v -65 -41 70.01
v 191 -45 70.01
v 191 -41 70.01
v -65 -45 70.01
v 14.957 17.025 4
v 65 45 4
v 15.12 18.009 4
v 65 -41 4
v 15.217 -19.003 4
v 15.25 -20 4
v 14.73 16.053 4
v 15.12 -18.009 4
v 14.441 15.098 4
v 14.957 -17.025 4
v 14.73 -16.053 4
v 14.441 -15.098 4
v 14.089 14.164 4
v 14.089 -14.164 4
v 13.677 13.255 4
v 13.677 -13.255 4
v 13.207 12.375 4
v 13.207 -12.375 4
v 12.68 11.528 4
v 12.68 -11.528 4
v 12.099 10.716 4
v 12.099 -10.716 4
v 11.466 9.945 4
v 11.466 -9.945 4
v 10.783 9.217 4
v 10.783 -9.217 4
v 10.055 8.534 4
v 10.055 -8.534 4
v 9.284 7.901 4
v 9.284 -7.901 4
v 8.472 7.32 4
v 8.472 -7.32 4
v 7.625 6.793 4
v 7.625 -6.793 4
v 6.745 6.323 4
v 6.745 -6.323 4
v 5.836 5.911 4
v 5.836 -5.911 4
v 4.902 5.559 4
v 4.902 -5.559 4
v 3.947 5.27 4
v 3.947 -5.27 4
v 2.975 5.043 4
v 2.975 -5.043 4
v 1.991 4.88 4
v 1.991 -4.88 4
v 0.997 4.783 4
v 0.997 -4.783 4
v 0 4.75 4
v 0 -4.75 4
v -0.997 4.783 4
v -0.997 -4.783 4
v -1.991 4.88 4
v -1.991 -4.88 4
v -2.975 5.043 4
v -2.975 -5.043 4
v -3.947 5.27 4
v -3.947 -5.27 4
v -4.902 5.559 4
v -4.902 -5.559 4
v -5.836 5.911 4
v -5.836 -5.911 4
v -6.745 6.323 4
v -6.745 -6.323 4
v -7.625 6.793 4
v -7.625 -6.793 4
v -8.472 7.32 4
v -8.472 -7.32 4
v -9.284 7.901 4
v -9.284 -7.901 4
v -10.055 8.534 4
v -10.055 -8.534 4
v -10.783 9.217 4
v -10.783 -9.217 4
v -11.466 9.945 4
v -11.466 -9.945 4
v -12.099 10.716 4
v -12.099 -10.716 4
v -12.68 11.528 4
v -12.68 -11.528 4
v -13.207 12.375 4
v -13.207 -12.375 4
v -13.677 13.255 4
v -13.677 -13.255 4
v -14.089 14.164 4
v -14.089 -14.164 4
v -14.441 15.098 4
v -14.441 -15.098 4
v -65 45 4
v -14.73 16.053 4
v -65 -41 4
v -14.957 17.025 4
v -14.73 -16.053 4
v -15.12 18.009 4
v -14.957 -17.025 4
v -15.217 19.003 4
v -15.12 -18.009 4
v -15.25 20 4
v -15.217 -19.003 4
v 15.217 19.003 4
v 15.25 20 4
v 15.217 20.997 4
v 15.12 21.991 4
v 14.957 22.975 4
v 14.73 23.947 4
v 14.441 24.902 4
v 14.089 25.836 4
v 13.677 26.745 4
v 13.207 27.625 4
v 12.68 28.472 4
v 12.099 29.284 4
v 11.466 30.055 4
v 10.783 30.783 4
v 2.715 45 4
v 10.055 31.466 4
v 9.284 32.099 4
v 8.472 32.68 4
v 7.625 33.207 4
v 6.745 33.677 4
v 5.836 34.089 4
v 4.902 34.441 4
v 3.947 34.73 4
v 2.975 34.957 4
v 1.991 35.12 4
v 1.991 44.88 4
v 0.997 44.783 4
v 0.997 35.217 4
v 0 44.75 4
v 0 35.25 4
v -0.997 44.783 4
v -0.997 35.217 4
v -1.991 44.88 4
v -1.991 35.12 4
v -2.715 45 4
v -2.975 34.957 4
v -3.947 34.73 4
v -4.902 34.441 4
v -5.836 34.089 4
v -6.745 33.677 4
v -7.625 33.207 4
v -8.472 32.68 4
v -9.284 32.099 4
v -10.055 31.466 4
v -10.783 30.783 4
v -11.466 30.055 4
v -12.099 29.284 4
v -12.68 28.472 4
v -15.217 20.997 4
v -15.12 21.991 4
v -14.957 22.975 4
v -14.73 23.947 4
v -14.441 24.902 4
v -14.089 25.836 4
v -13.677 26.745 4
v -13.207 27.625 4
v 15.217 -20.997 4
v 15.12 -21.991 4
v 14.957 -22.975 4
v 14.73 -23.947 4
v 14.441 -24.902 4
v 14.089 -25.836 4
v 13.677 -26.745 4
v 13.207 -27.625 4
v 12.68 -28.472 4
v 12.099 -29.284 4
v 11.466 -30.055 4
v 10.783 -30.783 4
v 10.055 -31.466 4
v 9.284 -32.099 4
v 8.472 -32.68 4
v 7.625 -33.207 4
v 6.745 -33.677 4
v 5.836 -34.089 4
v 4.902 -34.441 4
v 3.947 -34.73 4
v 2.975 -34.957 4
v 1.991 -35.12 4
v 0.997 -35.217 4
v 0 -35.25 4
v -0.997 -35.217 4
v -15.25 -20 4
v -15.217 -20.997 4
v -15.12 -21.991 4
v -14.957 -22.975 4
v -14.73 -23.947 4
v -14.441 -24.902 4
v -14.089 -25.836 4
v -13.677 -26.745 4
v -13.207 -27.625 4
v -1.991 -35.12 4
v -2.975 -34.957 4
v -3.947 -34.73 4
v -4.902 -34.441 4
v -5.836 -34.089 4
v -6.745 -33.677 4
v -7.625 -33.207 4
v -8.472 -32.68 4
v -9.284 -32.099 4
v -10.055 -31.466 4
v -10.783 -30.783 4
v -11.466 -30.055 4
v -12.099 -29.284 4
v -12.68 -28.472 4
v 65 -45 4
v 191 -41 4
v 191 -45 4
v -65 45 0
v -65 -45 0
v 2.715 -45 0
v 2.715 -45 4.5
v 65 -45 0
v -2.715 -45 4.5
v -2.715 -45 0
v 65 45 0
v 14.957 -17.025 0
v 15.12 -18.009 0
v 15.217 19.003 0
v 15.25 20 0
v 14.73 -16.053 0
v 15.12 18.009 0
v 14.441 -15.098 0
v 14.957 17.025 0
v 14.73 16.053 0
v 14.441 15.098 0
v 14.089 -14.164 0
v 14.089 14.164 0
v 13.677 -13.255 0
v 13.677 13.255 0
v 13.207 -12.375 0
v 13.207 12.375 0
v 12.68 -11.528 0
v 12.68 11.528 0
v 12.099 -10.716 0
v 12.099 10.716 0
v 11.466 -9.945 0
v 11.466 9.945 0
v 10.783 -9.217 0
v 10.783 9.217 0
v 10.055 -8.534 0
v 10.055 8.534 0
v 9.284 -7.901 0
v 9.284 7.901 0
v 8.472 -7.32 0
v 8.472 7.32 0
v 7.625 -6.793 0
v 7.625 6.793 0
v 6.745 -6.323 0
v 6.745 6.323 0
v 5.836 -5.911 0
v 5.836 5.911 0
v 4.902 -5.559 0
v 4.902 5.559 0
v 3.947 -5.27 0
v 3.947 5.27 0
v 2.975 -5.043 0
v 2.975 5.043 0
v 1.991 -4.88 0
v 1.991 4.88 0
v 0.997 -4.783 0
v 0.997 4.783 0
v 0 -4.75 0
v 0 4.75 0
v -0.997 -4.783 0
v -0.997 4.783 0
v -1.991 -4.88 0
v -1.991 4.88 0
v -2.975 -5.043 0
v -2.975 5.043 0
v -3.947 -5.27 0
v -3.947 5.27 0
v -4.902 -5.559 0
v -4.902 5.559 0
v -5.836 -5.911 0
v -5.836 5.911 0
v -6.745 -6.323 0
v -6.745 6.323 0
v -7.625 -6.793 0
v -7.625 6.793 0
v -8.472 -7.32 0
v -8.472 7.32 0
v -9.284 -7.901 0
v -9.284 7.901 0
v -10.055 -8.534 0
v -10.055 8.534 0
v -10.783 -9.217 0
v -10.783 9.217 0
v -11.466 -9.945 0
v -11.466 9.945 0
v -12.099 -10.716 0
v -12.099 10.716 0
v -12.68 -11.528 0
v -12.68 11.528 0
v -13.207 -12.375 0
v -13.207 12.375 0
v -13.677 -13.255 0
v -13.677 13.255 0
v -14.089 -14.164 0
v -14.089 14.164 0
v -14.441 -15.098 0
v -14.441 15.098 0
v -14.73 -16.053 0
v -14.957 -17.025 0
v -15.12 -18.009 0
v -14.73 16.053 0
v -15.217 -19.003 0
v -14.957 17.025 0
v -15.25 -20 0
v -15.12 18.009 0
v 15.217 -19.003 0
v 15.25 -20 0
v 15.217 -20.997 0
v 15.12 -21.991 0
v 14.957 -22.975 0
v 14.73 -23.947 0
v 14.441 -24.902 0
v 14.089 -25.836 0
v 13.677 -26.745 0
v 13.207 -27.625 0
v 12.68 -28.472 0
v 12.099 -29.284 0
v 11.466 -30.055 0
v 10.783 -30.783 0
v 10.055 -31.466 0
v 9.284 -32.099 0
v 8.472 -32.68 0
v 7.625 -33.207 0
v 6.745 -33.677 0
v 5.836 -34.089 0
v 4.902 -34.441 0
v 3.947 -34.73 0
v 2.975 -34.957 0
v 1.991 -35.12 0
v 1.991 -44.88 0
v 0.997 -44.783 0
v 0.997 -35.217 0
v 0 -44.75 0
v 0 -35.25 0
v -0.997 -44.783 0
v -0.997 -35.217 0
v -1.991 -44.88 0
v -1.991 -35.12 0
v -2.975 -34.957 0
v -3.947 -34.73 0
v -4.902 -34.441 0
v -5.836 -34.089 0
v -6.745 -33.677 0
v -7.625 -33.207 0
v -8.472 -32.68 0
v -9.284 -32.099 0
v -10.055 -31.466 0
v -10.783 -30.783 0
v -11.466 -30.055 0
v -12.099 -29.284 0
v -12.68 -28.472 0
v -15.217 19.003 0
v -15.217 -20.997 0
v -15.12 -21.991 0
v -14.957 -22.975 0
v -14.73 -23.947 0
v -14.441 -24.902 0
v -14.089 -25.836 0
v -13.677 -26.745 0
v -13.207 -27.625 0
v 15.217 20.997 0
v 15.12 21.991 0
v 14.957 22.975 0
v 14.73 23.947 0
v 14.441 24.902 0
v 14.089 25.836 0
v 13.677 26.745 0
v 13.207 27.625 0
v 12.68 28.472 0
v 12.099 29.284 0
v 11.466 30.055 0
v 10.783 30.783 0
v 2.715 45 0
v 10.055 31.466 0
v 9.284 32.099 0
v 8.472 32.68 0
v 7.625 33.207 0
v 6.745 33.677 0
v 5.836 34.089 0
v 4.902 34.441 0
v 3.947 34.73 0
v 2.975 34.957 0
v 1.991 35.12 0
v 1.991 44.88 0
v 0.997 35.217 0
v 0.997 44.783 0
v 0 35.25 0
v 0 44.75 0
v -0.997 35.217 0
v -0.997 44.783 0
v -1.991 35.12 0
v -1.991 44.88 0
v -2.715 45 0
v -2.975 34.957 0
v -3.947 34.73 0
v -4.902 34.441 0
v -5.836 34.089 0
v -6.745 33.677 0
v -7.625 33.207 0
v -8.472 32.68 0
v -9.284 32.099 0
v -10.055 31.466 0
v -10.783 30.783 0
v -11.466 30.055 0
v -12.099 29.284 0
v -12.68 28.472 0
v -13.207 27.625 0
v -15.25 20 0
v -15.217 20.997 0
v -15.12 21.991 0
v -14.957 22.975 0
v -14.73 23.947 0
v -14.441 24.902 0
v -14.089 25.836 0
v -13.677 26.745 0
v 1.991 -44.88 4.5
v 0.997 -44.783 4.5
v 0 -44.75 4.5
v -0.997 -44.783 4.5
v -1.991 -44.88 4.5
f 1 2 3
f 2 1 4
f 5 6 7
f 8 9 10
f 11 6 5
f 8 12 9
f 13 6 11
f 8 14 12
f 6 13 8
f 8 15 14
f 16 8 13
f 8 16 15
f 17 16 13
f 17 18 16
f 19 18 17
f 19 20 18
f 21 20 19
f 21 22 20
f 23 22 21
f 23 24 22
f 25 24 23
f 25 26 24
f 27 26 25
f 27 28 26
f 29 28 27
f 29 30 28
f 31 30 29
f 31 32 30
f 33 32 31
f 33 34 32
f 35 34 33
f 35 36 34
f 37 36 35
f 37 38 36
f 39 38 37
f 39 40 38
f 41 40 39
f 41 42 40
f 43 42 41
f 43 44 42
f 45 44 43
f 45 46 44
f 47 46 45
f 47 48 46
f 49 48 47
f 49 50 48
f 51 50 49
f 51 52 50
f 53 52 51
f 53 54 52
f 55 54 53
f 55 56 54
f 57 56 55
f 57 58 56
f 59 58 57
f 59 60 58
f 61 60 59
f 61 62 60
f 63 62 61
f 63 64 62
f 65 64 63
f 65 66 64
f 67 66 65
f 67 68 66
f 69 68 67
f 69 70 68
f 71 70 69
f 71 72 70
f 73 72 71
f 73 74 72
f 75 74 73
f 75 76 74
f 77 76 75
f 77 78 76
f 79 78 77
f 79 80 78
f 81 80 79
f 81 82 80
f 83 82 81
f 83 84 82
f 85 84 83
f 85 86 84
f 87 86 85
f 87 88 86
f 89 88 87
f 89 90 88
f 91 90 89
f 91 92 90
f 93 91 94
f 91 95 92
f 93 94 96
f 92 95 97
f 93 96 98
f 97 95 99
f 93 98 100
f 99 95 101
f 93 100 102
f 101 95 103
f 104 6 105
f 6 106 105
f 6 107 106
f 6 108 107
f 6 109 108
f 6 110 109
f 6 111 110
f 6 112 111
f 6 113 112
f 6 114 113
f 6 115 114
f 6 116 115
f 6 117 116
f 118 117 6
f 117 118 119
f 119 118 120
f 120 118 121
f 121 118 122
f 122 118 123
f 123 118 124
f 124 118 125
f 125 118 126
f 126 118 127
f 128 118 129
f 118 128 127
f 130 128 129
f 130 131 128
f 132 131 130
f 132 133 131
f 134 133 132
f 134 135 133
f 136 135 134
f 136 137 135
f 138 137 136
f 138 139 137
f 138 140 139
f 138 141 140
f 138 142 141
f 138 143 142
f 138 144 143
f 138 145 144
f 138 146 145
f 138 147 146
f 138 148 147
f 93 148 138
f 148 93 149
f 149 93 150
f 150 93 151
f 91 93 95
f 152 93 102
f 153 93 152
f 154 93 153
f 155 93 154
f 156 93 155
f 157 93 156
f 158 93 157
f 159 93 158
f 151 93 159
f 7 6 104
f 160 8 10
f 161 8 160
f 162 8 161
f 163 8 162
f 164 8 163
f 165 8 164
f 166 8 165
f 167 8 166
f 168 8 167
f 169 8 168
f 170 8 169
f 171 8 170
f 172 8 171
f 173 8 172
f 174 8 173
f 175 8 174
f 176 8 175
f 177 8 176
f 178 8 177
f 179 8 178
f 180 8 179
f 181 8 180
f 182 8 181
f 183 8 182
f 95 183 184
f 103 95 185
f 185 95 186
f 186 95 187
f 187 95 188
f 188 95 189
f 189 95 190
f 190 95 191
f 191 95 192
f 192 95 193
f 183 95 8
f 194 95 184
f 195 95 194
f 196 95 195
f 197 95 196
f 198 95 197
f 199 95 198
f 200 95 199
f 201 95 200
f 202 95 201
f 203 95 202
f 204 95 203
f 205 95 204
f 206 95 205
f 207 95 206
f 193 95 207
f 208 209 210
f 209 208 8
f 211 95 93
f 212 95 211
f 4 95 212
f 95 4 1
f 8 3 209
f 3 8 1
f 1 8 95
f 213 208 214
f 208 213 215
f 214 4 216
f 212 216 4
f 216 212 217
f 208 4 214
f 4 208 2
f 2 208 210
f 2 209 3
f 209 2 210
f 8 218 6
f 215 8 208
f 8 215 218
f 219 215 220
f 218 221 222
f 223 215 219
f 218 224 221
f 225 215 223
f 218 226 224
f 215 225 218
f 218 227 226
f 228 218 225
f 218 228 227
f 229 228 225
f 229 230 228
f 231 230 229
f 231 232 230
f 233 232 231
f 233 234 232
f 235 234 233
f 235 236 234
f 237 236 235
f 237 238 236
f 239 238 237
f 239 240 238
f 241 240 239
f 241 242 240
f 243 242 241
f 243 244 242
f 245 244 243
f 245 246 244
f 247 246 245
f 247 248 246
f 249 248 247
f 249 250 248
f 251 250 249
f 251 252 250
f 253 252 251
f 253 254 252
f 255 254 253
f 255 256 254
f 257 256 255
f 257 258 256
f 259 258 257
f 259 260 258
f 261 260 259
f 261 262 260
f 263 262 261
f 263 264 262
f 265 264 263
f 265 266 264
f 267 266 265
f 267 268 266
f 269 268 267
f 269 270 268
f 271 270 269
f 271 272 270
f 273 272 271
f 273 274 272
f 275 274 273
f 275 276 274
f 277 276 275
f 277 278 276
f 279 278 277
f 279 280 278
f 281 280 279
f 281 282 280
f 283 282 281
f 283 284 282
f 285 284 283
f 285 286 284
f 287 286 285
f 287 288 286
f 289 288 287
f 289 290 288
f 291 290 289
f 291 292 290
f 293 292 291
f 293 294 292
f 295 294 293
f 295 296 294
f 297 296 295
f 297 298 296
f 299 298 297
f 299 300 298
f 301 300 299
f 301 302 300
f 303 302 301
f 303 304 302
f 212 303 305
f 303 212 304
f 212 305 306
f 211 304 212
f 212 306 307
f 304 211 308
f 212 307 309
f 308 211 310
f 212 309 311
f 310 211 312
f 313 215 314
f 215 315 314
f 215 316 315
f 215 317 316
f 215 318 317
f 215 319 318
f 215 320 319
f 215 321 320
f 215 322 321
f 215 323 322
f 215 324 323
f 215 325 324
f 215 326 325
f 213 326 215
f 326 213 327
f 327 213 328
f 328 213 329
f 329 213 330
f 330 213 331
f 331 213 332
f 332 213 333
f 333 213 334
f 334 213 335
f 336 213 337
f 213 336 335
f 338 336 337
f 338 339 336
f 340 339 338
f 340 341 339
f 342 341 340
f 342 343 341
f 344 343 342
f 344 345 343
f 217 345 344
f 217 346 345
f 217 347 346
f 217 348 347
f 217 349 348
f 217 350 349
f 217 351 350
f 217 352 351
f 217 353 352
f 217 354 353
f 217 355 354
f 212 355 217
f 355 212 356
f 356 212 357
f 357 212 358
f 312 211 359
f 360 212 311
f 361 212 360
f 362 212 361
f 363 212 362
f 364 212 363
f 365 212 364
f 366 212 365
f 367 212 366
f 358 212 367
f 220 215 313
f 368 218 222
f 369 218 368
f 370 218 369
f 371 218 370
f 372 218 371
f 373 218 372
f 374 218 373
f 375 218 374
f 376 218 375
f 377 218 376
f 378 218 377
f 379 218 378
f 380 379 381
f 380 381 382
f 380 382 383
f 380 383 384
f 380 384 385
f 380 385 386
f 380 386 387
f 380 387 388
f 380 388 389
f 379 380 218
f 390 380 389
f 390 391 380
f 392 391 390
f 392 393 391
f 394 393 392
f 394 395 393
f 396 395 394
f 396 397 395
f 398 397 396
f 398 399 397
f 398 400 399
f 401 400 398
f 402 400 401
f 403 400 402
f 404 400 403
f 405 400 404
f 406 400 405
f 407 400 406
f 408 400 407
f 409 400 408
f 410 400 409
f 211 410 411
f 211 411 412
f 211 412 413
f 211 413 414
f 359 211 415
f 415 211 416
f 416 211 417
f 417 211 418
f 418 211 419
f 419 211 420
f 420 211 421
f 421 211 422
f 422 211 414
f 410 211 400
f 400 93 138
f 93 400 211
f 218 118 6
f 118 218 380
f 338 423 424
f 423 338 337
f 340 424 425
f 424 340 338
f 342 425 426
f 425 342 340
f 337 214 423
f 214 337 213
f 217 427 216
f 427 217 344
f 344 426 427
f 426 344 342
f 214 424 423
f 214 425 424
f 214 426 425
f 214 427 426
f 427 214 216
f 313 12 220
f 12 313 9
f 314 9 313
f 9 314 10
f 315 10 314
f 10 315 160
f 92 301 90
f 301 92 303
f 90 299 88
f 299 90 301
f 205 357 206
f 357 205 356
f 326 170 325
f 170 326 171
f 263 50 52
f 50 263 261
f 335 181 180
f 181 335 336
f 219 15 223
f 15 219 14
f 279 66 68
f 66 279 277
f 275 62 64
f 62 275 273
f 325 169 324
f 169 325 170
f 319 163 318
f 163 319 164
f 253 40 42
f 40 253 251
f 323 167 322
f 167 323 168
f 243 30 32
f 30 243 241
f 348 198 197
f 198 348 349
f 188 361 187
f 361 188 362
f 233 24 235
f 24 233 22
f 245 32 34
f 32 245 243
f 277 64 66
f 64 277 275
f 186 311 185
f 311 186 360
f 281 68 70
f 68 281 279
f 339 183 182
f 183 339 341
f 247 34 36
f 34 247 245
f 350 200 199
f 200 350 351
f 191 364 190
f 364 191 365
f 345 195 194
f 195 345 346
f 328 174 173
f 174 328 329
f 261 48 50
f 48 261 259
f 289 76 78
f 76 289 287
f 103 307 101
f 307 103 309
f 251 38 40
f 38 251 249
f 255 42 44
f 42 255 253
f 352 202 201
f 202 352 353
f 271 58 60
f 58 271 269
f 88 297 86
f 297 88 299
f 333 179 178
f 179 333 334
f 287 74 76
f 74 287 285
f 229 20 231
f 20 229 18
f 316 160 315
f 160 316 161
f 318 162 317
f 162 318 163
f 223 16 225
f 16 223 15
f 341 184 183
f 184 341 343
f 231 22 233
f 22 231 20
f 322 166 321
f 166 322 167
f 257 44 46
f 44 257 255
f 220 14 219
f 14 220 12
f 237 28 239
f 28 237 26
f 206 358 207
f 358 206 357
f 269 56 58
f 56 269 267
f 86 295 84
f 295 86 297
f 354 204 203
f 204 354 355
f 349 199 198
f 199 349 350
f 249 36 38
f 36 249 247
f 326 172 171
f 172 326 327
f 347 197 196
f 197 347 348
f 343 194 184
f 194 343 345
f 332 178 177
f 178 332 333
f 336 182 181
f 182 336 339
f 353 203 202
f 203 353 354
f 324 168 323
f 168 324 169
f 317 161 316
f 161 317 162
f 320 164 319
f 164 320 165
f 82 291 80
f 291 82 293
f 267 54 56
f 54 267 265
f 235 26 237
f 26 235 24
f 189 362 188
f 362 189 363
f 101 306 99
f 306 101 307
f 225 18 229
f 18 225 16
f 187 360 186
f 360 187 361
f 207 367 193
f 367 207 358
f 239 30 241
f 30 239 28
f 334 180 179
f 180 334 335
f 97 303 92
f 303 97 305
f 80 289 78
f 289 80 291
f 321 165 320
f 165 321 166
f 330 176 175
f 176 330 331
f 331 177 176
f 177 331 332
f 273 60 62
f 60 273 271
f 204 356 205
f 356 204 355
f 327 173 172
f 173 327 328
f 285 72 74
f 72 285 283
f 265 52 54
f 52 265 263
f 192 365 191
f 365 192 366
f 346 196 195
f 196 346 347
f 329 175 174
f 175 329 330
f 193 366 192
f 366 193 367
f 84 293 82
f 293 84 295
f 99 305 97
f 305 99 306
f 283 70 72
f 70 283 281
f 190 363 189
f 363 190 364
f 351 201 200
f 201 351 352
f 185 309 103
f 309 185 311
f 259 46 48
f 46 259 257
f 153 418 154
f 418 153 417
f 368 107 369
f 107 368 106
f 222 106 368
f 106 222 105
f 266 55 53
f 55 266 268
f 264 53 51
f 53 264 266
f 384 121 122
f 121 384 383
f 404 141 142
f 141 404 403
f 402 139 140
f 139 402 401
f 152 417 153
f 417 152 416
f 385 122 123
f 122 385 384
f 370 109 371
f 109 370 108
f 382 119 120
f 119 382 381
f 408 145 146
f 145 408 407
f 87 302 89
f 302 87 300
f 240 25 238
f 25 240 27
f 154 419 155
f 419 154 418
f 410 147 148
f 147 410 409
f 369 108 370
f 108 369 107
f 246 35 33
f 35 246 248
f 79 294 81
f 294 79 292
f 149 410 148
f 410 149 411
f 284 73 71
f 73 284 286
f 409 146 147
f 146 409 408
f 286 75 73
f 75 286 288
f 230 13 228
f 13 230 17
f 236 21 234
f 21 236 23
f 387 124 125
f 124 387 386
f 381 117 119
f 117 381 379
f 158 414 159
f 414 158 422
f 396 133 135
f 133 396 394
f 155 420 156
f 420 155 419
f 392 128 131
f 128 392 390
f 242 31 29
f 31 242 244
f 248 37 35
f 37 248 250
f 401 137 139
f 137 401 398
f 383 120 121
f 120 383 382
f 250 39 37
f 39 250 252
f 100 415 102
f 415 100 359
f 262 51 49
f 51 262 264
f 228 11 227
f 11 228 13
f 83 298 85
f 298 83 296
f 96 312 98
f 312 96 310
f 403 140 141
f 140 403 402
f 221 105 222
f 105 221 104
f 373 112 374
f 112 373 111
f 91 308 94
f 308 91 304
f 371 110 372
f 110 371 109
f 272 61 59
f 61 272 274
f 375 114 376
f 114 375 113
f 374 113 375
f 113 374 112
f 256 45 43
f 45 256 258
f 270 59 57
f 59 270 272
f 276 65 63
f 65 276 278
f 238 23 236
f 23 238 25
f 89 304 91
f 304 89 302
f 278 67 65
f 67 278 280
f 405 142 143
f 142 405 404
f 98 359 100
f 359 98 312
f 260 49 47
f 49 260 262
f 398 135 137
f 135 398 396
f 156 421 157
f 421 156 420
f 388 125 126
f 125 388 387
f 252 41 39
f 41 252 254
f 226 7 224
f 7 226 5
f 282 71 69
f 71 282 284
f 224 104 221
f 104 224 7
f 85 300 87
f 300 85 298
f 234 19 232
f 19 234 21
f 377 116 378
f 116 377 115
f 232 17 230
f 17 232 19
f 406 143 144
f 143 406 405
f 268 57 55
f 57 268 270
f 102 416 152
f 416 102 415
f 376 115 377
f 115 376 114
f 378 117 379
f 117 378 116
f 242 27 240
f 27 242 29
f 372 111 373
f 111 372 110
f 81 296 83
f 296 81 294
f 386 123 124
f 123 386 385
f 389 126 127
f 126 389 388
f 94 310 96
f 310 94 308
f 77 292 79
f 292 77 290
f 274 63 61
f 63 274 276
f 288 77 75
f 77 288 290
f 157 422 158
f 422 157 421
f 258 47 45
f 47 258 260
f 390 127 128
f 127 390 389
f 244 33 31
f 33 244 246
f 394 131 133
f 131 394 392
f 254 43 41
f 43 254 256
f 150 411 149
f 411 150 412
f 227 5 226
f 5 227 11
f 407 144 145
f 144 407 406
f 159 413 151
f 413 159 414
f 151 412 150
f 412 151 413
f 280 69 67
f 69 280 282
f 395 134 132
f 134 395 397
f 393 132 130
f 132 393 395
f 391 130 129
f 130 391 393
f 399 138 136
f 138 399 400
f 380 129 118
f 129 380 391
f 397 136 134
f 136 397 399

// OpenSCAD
// Rack for six 50 mL conical (Falcon-type) tubes
// Print orientation: flat plate on bed, walls rising to z = 70
// After printing, flip over so the rack stands on the walls

// ---------- Parameters ----------
plate_x      = 130;   // plate length along X (mm)
plate_y      = 90;    // plate width along Y (mm)
plate_t      = 4;     // plate thickness (mm), z = 0..4

hole_d       = 30.5;  // tube hole diameter (mm)
hole_count   = 6;     // number of holes
hole_pitch   = 40;    // centre-to-centre spacing, both directions (mm)
hole_rows    = 2;     // number of rows along Y
hole_cols    = 3;     // number of columns along X

wall_len     = plate_x; // wall length along X (mm)
wall_t       = 4;     // wall thickness along Y (mm)
wall_h       = 70;    // wall top height (mm), z = plate_t..70

eps          = 0.5;   // cutter overshoot past faces (mm)
$fn          = 96;    // curve resolution

// ---------- Model ----------
difference() {
    union() {
        // Base plate
        translate([-plate_x/2, -plate_y/2, 0])
            cube([plate_x, plate_y, plate_t]);

        // Two solid end walls, flush with long edges
        for (sx = [-1, 1])
            translate([sx > 0 ? plate_x/2 - wall_t : -plate_x/2,
                       -plate_y/2,
                       plate_t])
                cube([wall_len, wall_t, wall_h - plate_t + 0.01]);
    }

    // Holes in 2 rows (along Y) of 3 (along X), centred on plate
    for (i = [0 : hole_count - 1]) {
        y = (i - (hole_count - 1)/2) * hole_pitch;
        translate([0, y, -eps])
            cylinder(d = hole_d, h = plate_t + 2*eps);
    }
}
